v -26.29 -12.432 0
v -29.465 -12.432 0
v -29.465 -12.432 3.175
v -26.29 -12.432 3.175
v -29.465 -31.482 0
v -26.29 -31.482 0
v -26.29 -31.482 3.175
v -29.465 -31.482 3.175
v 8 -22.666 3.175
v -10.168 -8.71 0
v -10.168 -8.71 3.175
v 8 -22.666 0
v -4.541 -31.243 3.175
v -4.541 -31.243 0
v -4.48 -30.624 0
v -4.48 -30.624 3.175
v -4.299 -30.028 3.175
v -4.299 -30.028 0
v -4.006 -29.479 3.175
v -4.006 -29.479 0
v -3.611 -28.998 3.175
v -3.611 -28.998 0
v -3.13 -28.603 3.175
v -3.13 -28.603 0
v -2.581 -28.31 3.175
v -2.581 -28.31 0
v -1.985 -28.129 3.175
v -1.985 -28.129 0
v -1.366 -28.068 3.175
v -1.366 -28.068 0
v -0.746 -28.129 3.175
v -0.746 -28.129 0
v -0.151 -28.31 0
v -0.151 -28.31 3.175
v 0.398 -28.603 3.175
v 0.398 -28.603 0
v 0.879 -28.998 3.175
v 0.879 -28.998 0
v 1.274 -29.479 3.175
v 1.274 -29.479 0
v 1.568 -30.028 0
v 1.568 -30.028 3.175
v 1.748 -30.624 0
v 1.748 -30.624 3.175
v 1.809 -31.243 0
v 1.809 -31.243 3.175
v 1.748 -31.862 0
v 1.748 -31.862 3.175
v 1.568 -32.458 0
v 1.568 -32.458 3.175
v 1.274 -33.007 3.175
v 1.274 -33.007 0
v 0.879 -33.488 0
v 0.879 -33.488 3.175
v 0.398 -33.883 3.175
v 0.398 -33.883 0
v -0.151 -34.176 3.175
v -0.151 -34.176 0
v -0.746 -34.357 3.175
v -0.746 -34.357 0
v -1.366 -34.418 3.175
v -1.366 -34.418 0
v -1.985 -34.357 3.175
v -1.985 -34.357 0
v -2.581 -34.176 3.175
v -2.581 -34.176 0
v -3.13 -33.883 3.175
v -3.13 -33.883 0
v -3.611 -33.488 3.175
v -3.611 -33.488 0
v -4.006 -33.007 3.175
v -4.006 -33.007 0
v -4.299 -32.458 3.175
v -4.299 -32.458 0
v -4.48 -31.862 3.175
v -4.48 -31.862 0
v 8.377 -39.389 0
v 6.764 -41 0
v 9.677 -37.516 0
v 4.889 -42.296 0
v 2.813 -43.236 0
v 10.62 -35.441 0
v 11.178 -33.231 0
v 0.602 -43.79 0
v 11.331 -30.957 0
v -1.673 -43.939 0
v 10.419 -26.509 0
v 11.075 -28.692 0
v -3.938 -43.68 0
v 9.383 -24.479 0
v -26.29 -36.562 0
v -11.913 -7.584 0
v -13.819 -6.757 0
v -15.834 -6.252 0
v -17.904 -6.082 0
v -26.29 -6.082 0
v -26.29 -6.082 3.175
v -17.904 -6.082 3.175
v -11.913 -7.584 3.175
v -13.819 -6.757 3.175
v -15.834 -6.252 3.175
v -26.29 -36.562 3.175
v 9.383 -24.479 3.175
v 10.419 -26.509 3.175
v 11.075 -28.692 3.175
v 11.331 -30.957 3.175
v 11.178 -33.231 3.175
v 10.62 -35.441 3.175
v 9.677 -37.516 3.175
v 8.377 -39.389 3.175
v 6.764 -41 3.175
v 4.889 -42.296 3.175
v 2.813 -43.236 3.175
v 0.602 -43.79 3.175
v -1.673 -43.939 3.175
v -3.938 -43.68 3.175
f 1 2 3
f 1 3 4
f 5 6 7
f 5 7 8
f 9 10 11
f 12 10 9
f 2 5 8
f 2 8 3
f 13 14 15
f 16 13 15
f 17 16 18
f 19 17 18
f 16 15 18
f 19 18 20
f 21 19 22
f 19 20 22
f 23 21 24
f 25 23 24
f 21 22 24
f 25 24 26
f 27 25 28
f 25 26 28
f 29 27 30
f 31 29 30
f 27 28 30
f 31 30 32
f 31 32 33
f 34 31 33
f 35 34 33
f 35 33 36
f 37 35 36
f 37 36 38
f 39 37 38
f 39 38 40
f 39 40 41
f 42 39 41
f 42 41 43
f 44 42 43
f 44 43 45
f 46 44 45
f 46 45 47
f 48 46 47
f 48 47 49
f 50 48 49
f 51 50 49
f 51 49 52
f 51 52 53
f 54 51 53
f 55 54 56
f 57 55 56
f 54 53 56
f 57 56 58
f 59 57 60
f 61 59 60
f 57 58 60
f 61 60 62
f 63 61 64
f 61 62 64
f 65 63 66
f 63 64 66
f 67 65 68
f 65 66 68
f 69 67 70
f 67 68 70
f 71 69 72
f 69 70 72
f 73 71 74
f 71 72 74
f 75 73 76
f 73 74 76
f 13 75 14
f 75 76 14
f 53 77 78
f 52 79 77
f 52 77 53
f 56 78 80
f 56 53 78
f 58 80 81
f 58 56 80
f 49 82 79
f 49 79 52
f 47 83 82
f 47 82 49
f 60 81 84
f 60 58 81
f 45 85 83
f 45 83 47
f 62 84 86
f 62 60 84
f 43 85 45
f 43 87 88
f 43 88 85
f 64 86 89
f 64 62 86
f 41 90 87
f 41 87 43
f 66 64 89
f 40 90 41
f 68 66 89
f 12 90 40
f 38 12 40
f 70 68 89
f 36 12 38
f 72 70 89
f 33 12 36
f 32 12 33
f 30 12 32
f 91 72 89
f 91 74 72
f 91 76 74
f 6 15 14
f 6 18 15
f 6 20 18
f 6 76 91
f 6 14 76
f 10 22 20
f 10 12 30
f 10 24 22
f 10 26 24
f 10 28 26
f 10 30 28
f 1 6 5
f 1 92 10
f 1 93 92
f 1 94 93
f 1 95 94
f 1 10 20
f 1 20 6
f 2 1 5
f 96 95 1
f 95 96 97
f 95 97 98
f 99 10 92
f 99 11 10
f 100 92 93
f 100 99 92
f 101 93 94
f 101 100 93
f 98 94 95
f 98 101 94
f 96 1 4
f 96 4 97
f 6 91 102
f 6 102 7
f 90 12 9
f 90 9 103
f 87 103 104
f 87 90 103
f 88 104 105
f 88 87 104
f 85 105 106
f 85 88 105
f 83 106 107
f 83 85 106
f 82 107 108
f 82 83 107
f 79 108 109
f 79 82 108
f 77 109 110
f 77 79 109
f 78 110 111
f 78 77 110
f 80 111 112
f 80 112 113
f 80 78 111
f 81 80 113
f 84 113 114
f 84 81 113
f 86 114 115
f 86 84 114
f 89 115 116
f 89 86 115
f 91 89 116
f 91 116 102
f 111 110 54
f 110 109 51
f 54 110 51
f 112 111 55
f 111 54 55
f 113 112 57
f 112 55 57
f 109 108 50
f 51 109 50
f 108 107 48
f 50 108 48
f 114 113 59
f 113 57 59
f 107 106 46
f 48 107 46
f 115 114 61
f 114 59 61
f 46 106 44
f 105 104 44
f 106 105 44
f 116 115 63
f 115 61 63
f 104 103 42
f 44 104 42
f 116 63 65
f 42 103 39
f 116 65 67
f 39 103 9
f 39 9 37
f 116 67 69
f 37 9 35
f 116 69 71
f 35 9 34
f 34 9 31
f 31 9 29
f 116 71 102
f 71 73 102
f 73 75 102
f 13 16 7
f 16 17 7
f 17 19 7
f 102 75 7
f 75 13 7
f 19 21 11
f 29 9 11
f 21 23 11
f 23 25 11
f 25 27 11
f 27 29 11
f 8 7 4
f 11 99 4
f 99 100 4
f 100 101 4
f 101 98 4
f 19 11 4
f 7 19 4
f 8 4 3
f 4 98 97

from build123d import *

# Parameters (mm, degrees)
BOSS_EXTRUDE1_DEPTH             = 3.175
F_1_4_0_25_DIAMETER_HOLE1_D     = 6.35
F_1_4_0_25_DIAMETER_HOLE1_DEPTH = 9.268267535
F_1_4_0_25_DIAMETER_HOLE1_TIP   = 1.907732465
FILLET1_R                       = 12.7


with BuildPart() as part:
    # Sketch1 → Boss-Extrude1 (new body)
    with BuildSketch(Plane.XY):
        with BuildLine():
            Line((-26.289500227, -31.481815247), (-29.464500227, -31.481815247))
            Line((-29.464500227, -31.481815247), (-29.464500227, -12.431815247))
            Line((-29.464500227, -12.431815247), (-26.289500227, -12.431815247))
            Line((-26.289500227, -12.431815247), (-26.289500227, -6.081815247))
            Line((-26.289500227, -6.081815247), (-13.589500227, -6.081815247))
            Line((-13.589500227, -6.081815247), (8.000499773, -22.666158546))
            ThreePointArc((8.000499773, -22.666158546), (9.676721644, -37.516329042), (-3.937500227, -43.67995187))
            Line((-3.937500227, -43.67995187), (-26.289500227, -36.561815247))
            Line((-26.289500227, -36.561815247), (-26.289500227, -31.481815247))
        make_face()
    extrude(amount=BOSS_EXTRUDE1_DEPTH)

    # 1/4 (0.25) Diameter Hole1
    with Locations(Plane.XY.offset(3.175)):
        with Locations((-1.365750227, -31.243067134)):
            Hole(F_1_4_0_25_DIAMETER_HOLE1_D / 2, depth=F_1_4_0_25_DIAMETER_HOLE1_DEPTH)
            with Locations((0, 0, -(F_1_4_0_25_DIAMETER_HOLE1_DEPTH + F_1_4_0_25_DIAMETER_HOLE1_TIP / 2))):  # 118° drill point
                Cone(0, F_1_4_0_25_DIAMETER_HOLE1_D / 2, F_1_4_0_25_DIAMETER_HOLE1_TIP, mode=Mode.SUBTRACT)

    # Fillet1
    fillet1_edges = [part.edges().sort_by_distance(p)[0] for p in [
        (-13.589500227, -6.081815247, 1.5875),
    ]]
    fillet(fillet1_edges, radius=FILLET1_R)


solid = part.part
